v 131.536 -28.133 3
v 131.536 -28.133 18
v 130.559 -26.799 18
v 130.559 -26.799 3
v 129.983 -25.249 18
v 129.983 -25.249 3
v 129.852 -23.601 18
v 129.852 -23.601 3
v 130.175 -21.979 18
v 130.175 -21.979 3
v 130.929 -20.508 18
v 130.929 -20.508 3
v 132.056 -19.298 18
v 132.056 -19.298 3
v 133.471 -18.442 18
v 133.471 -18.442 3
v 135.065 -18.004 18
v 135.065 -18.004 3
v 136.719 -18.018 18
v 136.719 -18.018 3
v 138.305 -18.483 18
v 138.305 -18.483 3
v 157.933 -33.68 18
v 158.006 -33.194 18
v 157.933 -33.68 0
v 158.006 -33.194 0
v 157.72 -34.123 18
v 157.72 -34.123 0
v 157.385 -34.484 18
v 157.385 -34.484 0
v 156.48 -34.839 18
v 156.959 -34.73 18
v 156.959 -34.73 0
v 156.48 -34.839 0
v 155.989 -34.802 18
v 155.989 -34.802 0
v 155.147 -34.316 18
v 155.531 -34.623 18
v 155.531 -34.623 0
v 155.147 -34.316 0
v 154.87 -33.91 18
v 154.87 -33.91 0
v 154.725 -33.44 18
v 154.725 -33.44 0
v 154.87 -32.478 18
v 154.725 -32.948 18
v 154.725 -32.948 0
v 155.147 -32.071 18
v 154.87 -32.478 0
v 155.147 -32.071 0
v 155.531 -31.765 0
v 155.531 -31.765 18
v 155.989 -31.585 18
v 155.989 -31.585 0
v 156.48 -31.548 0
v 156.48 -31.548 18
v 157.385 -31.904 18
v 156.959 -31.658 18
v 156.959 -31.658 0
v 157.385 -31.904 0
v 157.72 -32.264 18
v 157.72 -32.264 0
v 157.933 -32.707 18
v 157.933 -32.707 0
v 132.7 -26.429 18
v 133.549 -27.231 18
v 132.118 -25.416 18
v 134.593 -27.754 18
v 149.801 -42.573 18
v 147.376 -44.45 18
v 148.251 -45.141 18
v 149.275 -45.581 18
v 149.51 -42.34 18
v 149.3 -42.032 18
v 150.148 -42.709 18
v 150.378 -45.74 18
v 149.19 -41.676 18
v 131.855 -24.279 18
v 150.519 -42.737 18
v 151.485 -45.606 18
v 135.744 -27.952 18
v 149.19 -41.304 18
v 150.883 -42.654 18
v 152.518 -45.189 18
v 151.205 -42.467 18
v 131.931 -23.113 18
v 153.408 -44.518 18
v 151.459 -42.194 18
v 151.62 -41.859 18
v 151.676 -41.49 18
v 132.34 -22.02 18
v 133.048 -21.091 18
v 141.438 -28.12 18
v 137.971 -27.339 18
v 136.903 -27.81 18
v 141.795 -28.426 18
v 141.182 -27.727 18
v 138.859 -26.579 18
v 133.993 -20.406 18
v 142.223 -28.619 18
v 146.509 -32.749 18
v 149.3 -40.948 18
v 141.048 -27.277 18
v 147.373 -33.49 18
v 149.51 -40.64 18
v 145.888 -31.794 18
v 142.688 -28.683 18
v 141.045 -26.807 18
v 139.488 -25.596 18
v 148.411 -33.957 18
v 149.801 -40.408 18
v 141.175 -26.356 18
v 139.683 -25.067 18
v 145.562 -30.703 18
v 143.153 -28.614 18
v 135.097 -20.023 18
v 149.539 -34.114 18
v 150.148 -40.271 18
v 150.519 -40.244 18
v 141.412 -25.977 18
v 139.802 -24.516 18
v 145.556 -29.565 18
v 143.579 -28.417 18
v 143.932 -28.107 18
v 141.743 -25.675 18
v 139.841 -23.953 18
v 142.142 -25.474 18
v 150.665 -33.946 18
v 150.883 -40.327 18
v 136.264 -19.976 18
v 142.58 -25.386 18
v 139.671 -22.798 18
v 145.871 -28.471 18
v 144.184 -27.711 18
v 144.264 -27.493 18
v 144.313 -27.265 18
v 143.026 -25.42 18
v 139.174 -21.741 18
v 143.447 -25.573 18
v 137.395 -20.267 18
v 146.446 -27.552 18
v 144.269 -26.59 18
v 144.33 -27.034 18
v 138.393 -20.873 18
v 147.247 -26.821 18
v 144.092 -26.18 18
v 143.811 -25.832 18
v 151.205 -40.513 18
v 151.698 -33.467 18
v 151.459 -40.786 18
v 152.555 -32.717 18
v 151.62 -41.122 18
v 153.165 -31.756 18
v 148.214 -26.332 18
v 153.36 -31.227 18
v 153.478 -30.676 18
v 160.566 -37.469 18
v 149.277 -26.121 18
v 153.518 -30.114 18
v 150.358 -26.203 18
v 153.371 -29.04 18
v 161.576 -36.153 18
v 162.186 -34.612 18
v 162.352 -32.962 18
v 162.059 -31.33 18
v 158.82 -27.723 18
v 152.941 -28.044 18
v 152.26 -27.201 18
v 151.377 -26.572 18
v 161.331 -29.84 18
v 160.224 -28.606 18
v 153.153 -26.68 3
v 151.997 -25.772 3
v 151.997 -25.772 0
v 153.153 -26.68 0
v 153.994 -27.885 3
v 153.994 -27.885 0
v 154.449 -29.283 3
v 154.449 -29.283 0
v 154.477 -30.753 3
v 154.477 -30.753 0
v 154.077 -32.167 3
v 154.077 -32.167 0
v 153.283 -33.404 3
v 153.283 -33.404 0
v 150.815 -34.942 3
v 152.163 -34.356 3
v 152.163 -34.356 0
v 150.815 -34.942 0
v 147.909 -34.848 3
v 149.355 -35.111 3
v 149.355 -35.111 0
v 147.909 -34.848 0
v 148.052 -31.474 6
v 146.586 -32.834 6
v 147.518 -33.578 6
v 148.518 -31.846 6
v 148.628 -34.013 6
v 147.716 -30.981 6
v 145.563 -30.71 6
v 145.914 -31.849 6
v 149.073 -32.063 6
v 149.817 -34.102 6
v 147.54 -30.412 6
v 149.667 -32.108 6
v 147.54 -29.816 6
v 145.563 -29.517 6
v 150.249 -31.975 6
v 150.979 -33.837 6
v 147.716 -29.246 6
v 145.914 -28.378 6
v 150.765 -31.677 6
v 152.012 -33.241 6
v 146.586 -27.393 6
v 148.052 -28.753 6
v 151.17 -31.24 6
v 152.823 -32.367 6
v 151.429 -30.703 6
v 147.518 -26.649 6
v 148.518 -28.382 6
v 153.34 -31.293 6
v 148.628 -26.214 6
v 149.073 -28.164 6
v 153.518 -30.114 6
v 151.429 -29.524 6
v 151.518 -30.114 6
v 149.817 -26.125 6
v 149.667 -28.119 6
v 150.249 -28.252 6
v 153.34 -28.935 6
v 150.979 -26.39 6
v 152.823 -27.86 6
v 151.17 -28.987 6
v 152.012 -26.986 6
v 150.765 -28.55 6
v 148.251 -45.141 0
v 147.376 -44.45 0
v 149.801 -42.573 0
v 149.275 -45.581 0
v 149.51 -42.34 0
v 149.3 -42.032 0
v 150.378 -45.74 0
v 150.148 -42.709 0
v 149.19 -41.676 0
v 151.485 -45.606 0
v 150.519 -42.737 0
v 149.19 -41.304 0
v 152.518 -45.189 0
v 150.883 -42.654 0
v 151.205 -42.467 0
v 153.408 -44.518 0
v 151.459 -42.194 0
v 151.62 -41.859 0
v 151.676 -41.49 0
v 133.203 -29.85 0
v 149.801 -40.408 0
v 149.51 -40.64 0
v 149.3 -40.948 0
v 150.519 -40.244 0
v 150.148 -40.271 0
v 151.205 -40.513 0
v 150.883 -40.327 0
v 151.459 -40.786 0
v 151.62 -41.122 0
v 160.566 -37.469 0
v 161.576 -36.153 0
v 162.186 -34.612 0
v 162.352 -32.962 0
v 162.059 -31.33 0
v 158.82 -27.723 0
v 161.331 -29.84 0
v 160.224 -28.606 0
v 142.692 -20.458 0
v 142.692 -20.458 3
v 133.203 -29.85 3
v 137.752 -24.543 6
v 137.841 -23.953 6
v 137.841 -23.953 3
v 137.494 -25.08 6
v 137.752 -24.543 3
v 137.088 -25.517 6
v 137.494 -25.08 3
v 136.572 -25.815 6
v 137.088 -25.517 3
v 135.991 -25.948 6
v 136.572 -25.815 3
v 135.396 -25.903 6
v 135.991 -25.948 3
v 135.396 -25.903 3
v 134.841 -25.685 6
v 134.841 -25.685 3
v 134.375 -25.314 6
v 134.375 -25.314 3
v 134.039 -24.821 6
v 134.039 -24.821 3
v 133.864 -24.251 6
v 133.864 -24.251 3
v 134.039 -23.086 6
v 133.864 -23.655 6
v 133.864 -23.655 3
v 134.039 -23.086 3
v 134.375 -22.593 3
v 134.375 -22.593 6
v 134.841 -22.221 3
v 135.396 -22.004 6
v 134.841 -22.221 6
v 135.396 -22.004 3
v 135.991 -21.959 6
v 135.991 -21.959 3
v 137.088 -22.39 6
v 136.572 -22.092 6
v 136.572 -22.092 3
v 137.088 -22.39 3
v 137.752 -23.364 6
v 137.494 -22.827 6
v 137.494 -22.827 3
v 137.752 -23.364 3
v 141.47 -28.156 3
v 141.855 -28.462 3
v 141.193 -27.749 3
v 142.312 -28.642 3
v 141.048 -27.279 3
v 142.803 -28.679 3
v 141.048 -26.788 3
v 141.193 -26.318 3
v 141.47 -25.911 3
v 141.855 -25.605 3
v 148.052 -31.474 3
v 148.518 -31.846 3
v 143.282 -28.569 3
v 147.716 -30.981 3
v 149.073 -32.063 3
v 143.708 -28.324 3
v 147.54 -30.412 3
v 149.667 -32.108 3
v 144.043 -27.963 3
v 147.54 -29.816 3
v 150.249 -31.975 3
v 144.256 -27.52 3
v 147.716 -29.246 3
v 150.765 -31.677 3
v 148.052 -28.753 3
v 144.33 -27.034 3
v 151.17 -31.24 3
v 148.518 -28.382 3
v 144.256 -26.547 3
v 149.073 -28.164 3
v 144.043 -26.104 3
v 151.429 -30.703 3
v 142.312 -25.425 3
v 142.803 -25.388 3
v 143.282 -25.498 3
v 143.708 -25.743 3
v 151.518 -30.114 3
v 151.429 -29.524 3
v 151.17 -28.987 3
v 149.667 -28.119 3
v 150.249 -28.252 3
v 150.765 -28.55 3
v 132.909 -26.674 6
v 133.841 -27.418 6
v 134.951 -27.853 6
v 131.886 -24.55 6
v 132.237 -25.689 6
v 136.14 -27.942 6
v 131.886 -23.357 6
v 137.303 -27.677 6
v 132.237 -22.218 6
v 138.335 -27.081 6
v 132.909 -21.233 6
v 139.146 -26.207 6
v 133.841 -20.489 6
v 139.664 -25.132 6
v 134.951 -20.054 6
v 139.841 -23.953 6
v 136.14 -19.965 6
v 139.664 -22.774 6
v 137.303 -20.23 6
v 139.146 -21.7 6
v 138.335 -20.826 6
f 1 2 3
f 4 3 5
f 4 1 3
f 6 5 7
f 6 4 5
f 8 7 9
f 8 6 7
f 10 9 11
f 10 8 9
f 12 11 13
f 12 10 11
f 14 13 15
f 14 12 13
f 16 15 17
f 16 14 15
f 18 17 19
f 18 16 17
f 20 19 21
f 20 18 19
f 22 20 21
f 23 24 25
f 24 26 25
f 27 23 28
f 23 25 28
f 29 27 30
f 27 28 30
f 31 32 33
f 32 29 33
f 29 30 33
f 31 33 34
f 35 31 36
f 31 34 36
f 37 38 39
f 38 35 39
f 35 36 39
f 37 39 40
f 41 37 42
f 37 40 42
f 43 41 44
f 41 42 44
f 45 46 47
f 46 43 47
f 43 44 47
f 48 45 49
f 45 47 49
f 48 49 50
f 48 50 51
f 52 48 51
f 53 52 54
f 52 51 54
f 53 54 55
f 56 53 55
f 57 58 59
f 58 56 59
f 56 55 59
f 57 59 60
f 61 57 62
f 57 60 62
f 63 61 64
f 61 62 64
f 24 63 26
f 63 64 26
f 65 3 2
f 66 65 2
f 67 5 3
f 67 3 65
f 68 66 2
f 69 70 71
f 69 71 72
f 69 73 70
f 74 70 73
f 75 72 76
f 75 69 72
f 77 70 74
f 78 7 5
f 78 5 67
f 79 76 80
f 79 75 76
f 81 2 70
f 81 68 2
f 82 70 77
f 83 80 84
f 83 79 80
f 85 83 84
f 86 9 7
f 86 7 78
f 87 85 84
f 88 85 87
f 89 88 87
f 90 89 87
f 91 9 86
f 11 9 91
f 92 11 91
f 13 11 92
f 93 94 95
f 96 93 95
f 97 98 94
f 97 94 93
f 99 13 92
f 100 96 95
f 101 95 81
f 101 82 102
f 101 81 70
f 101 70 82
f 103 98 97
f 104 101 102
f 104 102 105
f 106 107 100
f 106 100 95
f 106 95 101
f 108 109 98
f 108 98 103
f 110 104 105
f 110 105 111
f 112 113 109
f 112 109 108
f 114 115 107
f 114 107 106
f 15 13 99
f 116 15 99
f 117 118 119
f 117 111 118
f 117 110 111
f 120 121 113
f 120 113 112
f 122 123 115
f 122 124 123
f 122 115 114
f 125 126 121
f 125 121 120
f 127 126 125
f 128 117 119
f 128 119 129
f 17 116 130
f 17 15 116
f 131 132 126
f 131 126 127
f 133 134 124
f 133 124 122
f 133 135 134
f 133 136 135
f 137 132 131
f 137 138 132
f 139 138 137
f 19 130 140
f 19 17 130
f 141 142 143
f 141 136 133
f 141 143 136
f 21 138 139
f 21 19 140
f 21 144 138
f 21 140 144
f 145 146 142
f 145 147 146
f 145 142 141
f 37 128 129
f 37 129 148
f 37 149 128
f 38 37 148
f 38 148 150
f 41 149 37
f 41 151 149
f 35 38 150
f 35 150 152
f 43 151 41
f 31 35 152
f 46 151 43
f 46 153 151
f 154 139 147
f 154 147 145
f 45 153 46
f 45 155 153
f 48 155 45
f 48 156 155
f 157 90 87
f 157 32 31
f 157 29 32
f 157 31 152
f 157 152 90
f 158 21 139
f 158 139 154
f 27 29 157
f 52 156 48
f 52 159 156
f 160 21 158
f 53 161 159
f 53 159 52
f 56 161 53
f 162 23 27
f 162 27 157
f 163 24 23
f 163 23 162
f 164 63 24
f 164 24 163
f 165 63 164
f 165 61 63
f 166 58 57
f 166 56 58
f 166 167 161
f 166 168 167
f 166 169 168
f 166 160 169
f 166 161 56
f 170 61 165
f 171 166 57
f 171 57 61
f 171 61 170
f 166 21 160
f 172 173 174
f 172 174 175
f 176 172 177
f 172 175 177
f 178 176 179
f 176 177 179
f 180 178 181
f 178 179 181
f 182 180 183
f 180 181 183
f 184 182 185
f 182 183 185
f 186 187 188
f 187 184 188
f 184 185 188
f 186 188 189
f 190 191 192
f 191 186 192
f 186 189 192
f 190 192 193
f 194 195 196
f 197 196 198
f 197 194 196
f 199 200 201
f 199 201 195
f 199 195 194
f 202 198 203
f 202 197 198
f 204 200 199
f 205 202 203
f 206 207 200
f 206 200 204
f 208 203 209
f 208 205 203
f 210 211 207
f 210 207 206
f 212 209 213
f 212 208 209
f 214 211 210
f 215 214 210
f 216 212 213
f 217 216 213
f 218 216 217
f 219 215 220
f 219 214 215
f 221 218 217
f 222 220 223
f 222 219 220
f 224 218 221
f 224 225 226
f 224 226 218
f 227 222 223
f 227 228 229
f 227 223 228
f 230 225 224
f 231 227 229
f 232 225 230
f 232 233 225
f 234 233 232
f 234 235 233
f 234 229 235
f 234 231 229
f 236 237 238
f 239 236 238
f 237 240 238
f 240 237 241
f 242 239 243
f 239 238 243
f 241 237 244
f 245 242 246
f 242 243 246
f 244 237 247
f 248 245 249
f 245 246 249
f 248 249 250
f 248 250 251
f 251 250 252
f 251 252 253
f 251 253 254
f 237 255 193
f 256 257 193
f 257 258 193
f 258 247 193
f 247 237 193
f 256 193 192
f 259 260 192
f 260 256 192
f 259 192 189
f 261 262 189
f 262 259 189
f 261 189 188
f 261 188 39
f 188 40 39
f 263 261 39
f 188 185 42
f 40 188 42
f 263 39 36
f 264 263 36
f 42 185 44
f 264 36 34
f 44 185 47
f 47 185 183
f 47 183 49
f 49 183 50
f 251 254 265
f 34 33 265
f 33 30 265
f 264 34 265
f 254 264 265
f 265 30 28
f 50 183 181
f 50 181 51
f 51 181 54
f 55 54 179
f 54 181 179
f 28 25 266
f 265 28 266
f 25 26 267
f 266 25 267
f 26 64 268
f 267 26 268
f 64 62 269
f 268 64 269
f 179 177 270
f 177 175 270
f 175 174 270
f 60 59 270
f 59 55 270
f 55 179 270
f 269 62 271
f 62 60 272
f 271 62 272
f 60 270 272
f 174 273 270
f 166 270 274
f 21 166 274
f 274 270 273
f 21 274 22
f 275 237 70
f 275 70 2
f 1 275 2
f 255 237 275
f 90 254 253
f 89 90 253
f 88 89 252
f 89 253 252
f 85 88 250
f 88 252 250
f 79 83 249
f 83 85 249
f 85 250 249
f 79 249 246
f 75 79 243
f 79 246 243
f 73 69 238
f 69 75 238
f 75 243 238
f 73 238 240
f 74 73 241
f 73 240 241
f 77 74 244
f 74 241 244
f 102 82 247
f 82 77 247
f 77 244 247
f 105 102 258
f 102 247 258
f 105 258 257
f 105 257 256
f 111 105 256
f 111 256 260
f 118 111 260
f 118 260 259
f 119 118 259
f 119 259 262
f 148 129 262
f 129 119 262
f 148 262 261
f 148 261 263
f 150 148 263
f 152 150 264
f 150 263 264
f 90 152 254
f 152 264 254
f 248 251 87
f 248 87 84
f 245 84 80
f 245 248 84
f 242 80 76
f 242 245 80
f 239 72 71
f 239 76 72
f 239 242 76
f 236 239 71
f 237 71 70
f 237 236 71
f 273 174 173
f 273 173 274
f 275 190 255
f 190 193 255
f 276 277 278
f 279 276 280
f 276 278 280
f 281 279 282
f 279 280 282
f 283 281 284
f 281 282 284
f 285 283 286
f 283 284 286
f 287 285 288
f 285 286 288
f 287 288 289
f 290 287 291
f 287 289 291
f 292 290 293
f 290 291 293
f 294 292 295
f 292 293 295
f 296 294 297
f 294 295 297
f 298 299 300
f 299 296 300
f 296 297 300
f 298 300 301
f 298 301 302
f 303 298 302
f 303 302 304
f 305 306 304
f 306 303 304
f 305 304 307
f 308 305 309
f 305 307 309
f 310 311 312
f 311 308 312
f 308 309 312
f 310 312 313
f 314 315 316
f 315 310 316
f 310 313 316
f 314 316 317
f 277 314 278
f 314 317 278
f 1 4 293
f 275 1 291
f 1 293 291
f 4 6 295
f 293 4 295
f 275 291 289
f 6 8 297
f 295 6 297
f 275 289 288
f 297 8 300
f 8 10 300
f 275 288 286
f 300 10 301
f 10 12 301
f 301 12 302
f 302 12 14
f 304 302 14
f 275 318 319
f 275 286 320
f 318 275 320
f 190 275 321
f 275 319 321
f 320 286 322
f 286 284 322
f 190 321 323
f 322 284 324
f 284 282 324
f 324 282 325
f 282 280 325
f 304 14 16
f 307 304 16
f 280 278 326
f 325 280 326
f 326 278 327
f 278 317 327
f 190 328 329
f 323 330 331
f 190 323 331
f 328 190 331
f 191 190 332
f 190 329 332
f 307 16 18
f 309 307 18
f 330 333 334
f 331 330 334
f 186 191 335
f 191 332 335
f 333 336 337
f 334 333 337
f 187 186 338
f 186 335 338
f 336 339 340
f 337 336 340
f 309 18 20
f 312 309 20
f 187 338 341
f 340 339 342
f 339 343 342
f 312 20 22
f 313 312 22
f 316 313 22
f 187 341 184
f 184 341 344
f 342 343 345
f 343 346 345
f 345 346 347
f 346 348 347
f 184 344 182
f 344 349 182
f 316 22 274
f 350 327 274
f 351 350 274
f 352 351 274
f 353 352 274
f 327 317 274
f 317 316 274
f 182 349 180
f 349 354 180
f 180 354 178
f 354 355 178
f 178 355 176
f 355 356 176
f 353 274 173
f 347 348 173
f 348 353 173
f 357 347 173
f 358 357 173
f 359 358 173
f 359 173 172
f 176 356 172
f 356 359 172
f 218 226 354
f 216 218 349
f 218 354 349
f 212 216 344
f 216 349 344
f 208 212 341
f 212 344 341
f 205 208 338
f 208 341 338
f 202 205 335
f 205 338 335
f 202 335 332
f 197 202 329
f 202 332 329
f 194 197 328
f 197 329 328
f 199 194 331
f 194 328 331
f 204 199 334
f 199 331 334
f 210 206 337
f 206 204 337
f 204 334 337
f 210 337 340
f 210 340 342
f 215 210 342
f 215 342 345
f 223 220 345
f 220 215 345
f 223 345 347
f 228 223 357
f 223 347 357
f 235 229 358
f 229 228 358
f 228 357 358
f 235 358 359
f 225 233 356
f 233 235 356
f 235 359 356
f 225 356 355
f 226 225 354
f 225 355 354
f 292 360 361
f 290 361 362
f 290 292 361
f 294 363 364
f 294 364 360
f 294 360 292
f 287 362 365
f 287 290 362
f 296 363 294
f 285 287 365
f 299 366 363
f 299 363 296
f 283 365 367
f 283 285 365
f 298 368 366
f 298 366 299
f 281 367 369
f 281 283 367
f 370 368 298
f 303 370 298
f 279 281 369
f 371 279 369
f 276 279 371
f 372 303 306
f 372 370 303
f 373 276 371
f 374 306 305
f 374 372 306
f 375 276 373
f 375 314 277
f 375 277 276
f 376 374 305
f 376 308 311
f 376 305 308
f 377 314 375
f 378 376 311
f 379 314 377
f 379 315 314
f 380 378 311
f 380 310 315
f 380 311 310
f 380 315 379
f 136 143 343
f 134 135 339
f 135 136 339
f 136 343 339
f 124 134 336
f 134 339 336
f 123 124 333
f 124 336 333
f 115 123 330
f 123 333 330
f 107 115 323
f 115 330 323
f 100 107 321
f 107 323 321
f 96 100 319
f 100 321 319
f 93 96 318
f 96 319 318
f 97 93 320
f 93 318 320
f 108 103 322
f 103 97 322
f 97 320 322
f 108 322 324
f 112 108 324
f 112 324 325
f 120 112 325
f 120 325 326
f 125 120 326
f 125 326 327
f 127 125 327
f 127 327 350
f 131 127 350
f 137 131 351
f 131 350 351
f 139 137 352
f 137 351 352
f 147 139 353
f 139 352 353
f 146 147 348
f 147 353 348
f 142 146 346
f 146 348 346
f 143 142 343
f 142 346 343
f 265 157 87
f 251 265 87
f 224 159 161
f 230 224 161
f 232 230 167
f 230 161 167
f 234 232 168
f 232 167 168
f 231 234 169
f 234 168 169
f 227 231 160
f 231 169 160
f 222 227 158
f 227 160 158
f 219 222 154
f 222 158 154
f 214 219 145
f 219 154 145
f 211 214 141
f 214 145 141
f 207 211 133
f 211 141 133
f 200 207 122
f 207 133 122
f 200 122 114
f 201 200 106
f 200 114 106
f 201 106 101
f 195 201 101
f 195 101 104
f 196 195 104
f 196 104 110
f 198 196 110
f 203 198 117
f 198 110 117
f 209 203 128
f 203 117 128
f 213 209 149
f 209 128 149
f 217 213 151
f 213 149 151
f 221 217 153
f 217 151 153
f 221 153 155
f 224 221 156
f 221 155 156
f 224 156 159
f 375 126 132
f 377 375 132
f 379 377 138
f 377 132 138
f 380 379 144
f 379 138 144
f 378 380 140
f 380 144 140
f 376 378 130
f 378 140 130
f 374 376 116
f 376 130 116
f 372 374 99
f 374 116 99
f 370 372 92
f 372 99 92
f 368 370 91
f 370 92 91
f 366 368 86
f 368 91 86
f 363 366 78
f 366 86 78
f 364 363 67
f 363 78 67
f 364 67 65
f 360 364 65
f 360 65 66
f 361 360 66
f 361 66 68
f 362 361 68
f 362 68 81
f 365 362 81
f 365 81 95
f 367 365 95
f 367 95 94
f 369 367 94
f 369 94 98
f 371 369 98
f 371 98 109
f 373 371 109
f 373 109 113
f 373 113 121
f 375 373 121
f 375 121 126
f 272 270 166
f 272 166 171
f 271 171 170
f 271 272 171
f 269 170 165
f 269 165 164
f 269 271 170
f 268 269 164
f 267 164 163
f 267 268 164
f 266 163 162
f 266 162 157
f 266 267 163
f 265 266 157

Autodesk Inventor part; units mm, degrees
ref_plane "YZ Plane" through (0, 0, 0) normal (1, 0, 0) x (0, 1, 0)
ref_plane "XZ Plane" through (0, 0, 0) normal (0, 1, 0) x (-1, 0, 0)
ref_plane "XY Plane" through (0, 0, 0) normal (0, 0, 1) x (1, 0, 0)
sketch "スケッチ1" plane through (0, 0, 0) normal (0, 0, 1) x (1, 0, 0)
  line L0 (-170.6512, -31.4118) -> (202.8656, -31.4118) construction
  circle A0 centre (-14, -17.4118) radius 14 construction
  circle A1 centre (14, -17.4118) radius 14 construction
  circle A2 centre (-28.0204, 0.0121) radius 20.05 construction
  circle A3 centre (-28.0204, 0.0121) radius 5.05 construction
  circle A4 centre (8.8763, 3.8907) radius 32.05 construction
  circle A5 centre (8.8763, 3.8907) radius 10.1 construction
  circle A6 centre (54.047, 13.5882) radius 36.1 construction
  line L1 (-170.915, -81.4118) -> (490.0044, -81.4118)
  circle A7 centre (-28.0204, 0.0121) radius 22.342 construction
  circle A8 centre (-39.4931, 19.1835) radius 14 construction
  circle A9 centre (-49.0547, 7.5438) radius 14 construction
  circle A10 centre (-49.0547, -7.5196) radius 14 construction
  circle A11 centre (-39.4931, -19.1593) radius 14 construction
  circle A12 centre (8.8763, 3.8907) radius 33.05 construction
  circle A13 centre (54.047, 13.5882) radius 38.1 construction
  line L2 (-11.5565, -29.1593) -> (4.2969, -29.1593) construction
  line L3 (-67.2952, 44.8622) -> (-67.2952, -57.3934) construction
  line L4 (-149.4523, -1.6098) -> (-132.6633, -31.6026)
  line L5 (-132.7701, -31.4118) -> (-132.7701, 74.0456)
  circle A14 centre (-11.4931, -19.1593) radius 14 construction
  line L6 (-197.2268, -33.1593) -> (179.6604, -33.1593) construction
  circle A15 centre (54.047, 13.5882) radius 4.025 construction
  circle A16 centre (54.047, 13.5882) radius 6 construction
  circle A17 centre (-39.4931, 19.1835) radius 5
  circle A18 centre (-49.0547, 7.5438) radius 5
  circle A19 centre (-49.0547, -7.5196) radius 5
  circle A20 centre (-39.4931, -19.1593) radius 5
  circle A21 centre (-39.4931, 19.1835) radius 8 construction
  circle A22 centre (-49.0547, 7.5438) radius 8 construction
  circle A23 centre (-49.0547, -7.5196) radius 8 construction
  circle A24 centre (-39.4931, -19.1593) radius 8 construction
  circle A25 centre (-28.0204, 0.0121) radius 4.5
  circle A26 centre (8.8763, 3.8907) radius 7.5
  line L7 (-17.5497, 32.3149) -> (-46.3578, 15.0755) construction
  line L8 (-46.3578, 15.0755) -> (-51.7515, 0.0121) construction
  line L9 (-51.7515, 0.0121) -> (-46.3578, -15.0513) construction
  line L10 (-46.3578, -15.0513) -> (-37.9391, -20.0892) construction
  circle A27 centre (-32.6283, 23.2915) radius 1.3
  circle A28 centre (-46.3578, 15.0755) radius 1.3
  circle A29 centre (-51.7515, 0.0121) radius 1.3
  circle A30 centre (-46.3578, -15.0513) radius 1.3
  circle A31 centre (-32.6283, -23.2673) radius 1.3
  line L11 (-67.2952, 23.1796) -> (-67.2952, -18.1327)
  arc A32 (79.2003, -37.212) -> (87.3507, -31.2711) centre (80.4159, -30.3183) ccw
  arc A33 (8.1864, 50.8943) -> (0.9804, 51.9708) centre (3.7003, 45.5208) ccw
  line L12 (-52.2685, -33.1593) -> (56.2168, -33.1593)
  line L13 (56.2168, -33.1593) -> (79.2003, -37.212)
  arc A34 (92.7831, 8.2659) -> (29.742, 44.2162) centre (54.047, 13.5882) ccw
  line L14 (87.3507, -31.2711) -> (92.7831, 8.2659)
  line L15 (0.9804, 51.9708) -> (-67.2952, 23.1796)
  circle A35 centre (34.0114, -24.0061) radius 4.5 construction
  circle A36 centre (34.0114, -24.0061) radius 1.5
  circle A37 centre (-21.4477, 26.0369) radius 4.5 construction
  circle A38 centre (-21.4477, 26.0369) radius 1.5
  circle A39 centre (-56.0504, 23.0377) radius 1.5
  circle A40 centre (-56.0504, 23.0377) radius 3 construction
  circle A41 centre (-56.0504, 23.0377) radius 4.5 construction
  circle A42 centre (-64.2952, 0.0121) radius 1.5
  circle A43 centre (-64.2952, 0.0121) radius 3 construction
  circle A44 centre (-64.2952, 0.0121) radius 4.3311 construction
  line L16 (54.047, 13.5882) -> (99.37, -7.5264)
  line L17 (99.37, -7.5264) -> (58.3399, 10.9541)
  line L18 (58.3399, 10.9541) -> (30.7326, 32.4678)
  line L19 (30.7326, 32.4678) -> (54.047, 13.5882)
  line L20 (99.37, -7.5264) -> (491.4359, -184.1173)
  line L21 (-183.2789, 162.2213) -> (-183.2789, -125.2315)
  line L22 (516.7211, 155.5913) -> (516.7211, -155.5644)
  circle A45 centre (99.37, -7.5264) radius 7.25
  line L23 (149.518, -30.1136) -> (397.5027, -198.9436) construction
  line L24 (220.2014, -78.2354) -> (225.3858, -8.4277) construction
  circle A46 centre (3.7003, 45.5208) radius 4
  circle A47 centre (135.8413, -23.9534) radius 2
  circle A48 centre (149.518, -30.1136) radius 2
  arc A49 (147.9092, -34.8477) -> (151.9972, -25.7715) centre (149.518, -30.1136) ccw
  line L25 (147.9092, -34.8477) -> (96.0719, -17.2312)
  line L26 (151.9972, -25.7715) -> (104.4523, 1.3749)
  circle A50 centre (30.7326, 32.4678) radius 2
  circle A51 centre (-16.1798, -24.0771) radius 4.5 construction
  circle A52 centre (-16.1798, -24.0771) radius 1.5
  line L27 (-67.2952, -18.1327) -> (-52.2685, -33.1593)
  circle A53 centre (-56.0504, -23.0135) radius 1.5
  circle A54 centre (-56.0504, -23.0135) radius 3 construction
  circle A55 centre (30.7326, 32.4678) radius 4
  arc A56 (56.8403, 15.6972) -> (51.3644, 11.3402) centre (54.047, 13.5882) ccw construction
  line L28 (96.4916, -6.1854) -> (101.9705, -5.7041) construction
  line L29 (101.9705, -5.7041) -> (99.6479, -10.6896) construction
  line L30 (99.6479, -10.6896) -> (96.4916, -6.1854) construction
  circle A57 centre (99.6479, -10.6896) radius 1.5
  circle A58 centre (101.9705, -5.7041) radius 1.5
  circle A59 centre (96.4916, -6.1854) radius 1.5
  circle A60 centre (99.37, -7.5264) radius 6
  arc A61 (97.7876, -15.8778) -> (97.5111, 0.7679) centre (99.37, -7.5264) ccw
  arc A62 (56.8403, 15.6972) -> (97.5111, 0.7679) centre (88.7632, 39.7996) ccw
  arc A63 (51.3644, 11.3402) -> (97.7876, -15.8778) centre (112.6811, 62.7237) ccw
  circle A64 centre (54.047, 13.5882) radius 8.5 construction
  line L31 (102.9595, 0.1786) -> (57.6365, 21.2931) construction
  line L32 (50.4575, 5.8833) -> (95.7806, -15.2313) construction
  circle A65 centre (12.7384, 41.2415) radius 3 construction
  circle A66 centre (12.7384, 41.2415) radius 4.5 construction
  circle A67 centre (12.7384, 41.2415) radius 1.5
  circle A68 centre (80.4159, -30.3183) radius 4
  circle A69 centre (69.7531, -26.0108) radius 1.5
  circle A70 centre (69.7531, -26.0108) radius 4.5 construction
  circle A71 centre (-56.0504, -23.0135) radius 4.5 construction
  line L33 (8.1864, 50.8943) -> (15.9809, 44.3871)
  arc A72 (15.9809, 44.3871) -> (29.742, 44.2162) centre (22.9664, 52.7545) ccw
  circle A73 centre (-5.4761, 38.5895) radius 1.5
  circle A74 centre (-5.4761, 38.5895) radius 4.5 construction
  circle A75 centre (54.047, 13.5882) radius 50 construction
  circle A76 centre (3.7003, 45.5208) radius 2
  circle A77 centre (80.4159, -30.3183) radius 2
  circle A78 centre (54.047, 13.5882) radius 1.5
  circle A79 centre (58.3399, 10.9541) radius 1.5
  circle A80 centre (58.3399, 10.9541) radius 3
  arc A81 (59.8474, 15.7214) -> (55.7687, 6.6659) centre (58.3399, 10.9541) ccw
  line L34 (94.099, -16.3172) -> (55.7687, 6.6659)
  line L35 (59.8474, 15.7214) -> (102.4604, 2.2467)
  arc A82 (104.4523, 1.3749) -> (102.4604, 2.2467) centre (99.37, -7.5264) ccw
  arc A83 (94.099, -16.3172) -> (96.0719, -17.2312) centre (99.37, -7.5264) ccw
  circle A84 centre (30.7326, 32.4678) radius 5.025
  circle A85 centre (30.7326, 32.4678) radius 8.025
  circle A86 centre (58.3399, 10.9541) radius 4.025
  circle A87 centre (58.3399, 10.9541) radius 7.025
  line L36 (25.9827, 25.9995) -> (54.1819, 5.2918)
  line L37 (53.3095, 15.8577) -> (37.1861, 27.6978)
  line L38 (65.3516, 11.3852) -> (66.2721, -3.5865)
  line L39 (66.2721, -3.5865) -> (54.1819, 5.2918)
  line L40 (67.2722, 8.2659) -> (69.0337, -1.2879)
  line L41 (67.2722, 8.2659) -> (82.8858, 8.4364)
  point P0 (0, 0)
  point P1 (0, 0)
  point P2 (0, 0)
  point P3 (-49.0547, 7.5438)
  point P4 (-49.0547, -7.5196)
  dimension "d88" = 100
  dimension "d0" = 40.1
  dimension "d1" = 10.1
  dimension "d2" = 64.1
  dimension "d3" = 20.2
  dimension "d4" = 72.2
  dimension "d5" = 95
  dimension "d6" = 44.684
  dimension "d7" = 28
  dimension "d8" = 28
  dimension "d9" = 28
  dimension "d10" = 28
  dimension "d11" = 1
  dimension "d12" = 2
  dimension "d13" = 4
  dimension "d14" = 8.05
  dimension "d15" = 12
  dimension "d16" = 10
  dimension "d17" = 10
  dimension "d18" = 10
  dimension "d19" = 10
  dimension "d20" = 3
  dimension "d21" = 3
  dimension "d22" = 3
  dimension "d23" = 3
  dimension "d24" = 9
  dimension "d25" = 15
  dimension "d26" = 2.6
  dimension "d27" = 2.6
  dimension "d28" = 2.6
  dimension "d29" = 2.6
  dimension "d30" = 2.6
  dimension "d31" = 1
  dimension "d32" = 9
  dimension "d33" = 3
  dimension "d34" = 9
  dimension "d35" = 3
  dimension "d36" = 3
  dimension "d37" = 6
  dimension "d38" = 9
  dimension "d39" = 3
  dimension "d40" = 6
  dimension "d41" = 50
  dimension "d42" = 45
  dimension "d43" = 35
  dimension "d44" = 30
  dimension "d45" = 39
  dimension "d46" = 430
  dimension "d47" = 700
  dimension "d48" = 14.5
  dimension "d49" = 300
  dimension "d50" = 10
  dimension "d51" = 70
  dimension "d52" = 120
  dimension "d53" = 140
  dimension "d54" = 8
  dimension "d55" = 4
  dimension "d56" = 4
  dimension "d57" = 15
  dimension "d58" = 40
  dimension "d59" = 10
  dimension "d60" = 4
  dimension "d61" = 9
  dimension "d62" = 3
  dimension "d63" = 3
sketch "スケッチ2" plane through (0, 0, 0) normal (0, 0, 1) x (1, 0, 0)
  circle A0 centre (149.518, -30.1136) radius 2 projected
  circle A1 centre (135.8413, -23.9534) radius 2 projected
  line L0 (151.9972, -25.7715) -> (104.4523, 1.3749) projected
  arc A2 (147.9092, -34.8477) -> (151.9972, -25.7715) centre (149.518, -30.1136) ccw projected
  line L1 (147.9092, -34.8477) -> (96.0719, -17.2312) projected
  circle A3 centre (142.6796, -27.0335) radius 1.65
  circle A4 centre (156.3563, -33.1937) radius 1.65
  line L2 (135.8413, -23.9534) -> (213.3942, -58.8842)
  circle A5 centre (142.6796, -27.0335) radius 5 construction
  circle A6 centre (150.426, -41.4901) radius 1.25
  arc A7 (147.3765, -44.4504) -> (153.4081, -44.5182) centre (150.426, -41.4901) ccw
  line L3 (154.5328, -32.3723) -> (140.4569, -63.6234) construction
  line L4 (154.3028, -43.2363) -> (188.3811, -58.5855) construction
  line L5 (160.5664, -37.4686) -> (153.4081, -44.5182)
  arc A8 (138.3053, -18.4827) -> (131.5361, -28.1326) centre (135.8413, -23.9534) ccw
  line L6 (158.8204, -27.723) -> (138.3053, -18.4827)
  line L7 (147.3765, -44.4504) -> (131.5361, -28.1326)
  arc A9 (160.5664, -37.4686) -> (158.8204, -27.723) centre (156.3563, -33.1937) ccw
  point P0 (0, 0)
  dimension "d104" = 3.3
  dimension "d105" = 3.3
  dimension "d106" = 15
  dimension "d107" = 10
  dimension "d109" = 2.5
  dimension "d110" = 3
  dimension "d111" = 13
  dimension "d112" = 10
  dimension "d113" = 6
  dimension "d114" = 6
  dimension "d115" = 7.5
extrude "押し出し1" add sketch "スケッチ2" along normal blind 18 contours A2 L1 L7 A8 L6 L0 | A2 L0 L6 A9 L2 A4 | L2 A4 A9 L5 A7 L7 L1 A2
sketch "スケッチ3" plane through (0, 0, 18) normal (0, 0, 1) x (1, 0, 0)
  circle A0 centre (135.8413, -23.9534) radius 2 projected
  circle A1 centre (149.518, -30.1136) radius 2 projected
  circle A2 centre (156.3563, -33.1937) radius 1.65 projected
  circle A3 centre (142.6796, -27.0335) radius 1.65 projected
  circle A4 centre (150.426, -41.4901) radius 1.25 projected
  line L0 (153.4081, -44.5182) -> (160.5664, -37.4686) projected
  arc A5 (160.5664, -37.4686) -> (158.8204, -27.723) centre (156.3563, -33.1937) ccw projected
  line L1 (158.8204, -27.723) -> (138.3053, -18.4827) projected
  arc A6 (138.3053, -18.4827) -> (131.5361, -28.1326) centre (135.8413, -23.9534) ccw projected
  line L2 (131.5361, -28.1326) -> (147.3765, -44.4504) projected
  arc A7 (147.3765, -44.4504) -> (153.4081, -44.5182) centre (150.426, -41.4901) ccw projected
  circle A8 centre (135.8413, -23.9534) radius 4
  circle A9 centre (149.518, -30.1136) radius 4
  point P0 (0, 0)
  dimension "d118" = 8
  dimension "d119" = 8
extrude "押し出し2" cut sketch "スケッチ3" against normal blind 12 contours A8 | A9
extrude "押し出し3" cut sketch "スケッチ1" along normal blind 3 contours L35 A82 L26 A49 L20 A48 A47 A61 A62 L14 | L14 A62 L16 L40 L41 L35 | L34 L40 A62 L17 L14 | L14 L17 A45 L20 A61 A63 L34 | A63 A61 L20 A47 A48 A49 L25 A83 L34 | A62 A61 L20 A45 L16 L14 | L14 L16 A62 | L17 A62 L16 L14 | L14 L16 A45 L17 | A62 L17 L40 L16 | A62 L40 L17
properties part number "アダプター" material "アルミニウム 7075"
